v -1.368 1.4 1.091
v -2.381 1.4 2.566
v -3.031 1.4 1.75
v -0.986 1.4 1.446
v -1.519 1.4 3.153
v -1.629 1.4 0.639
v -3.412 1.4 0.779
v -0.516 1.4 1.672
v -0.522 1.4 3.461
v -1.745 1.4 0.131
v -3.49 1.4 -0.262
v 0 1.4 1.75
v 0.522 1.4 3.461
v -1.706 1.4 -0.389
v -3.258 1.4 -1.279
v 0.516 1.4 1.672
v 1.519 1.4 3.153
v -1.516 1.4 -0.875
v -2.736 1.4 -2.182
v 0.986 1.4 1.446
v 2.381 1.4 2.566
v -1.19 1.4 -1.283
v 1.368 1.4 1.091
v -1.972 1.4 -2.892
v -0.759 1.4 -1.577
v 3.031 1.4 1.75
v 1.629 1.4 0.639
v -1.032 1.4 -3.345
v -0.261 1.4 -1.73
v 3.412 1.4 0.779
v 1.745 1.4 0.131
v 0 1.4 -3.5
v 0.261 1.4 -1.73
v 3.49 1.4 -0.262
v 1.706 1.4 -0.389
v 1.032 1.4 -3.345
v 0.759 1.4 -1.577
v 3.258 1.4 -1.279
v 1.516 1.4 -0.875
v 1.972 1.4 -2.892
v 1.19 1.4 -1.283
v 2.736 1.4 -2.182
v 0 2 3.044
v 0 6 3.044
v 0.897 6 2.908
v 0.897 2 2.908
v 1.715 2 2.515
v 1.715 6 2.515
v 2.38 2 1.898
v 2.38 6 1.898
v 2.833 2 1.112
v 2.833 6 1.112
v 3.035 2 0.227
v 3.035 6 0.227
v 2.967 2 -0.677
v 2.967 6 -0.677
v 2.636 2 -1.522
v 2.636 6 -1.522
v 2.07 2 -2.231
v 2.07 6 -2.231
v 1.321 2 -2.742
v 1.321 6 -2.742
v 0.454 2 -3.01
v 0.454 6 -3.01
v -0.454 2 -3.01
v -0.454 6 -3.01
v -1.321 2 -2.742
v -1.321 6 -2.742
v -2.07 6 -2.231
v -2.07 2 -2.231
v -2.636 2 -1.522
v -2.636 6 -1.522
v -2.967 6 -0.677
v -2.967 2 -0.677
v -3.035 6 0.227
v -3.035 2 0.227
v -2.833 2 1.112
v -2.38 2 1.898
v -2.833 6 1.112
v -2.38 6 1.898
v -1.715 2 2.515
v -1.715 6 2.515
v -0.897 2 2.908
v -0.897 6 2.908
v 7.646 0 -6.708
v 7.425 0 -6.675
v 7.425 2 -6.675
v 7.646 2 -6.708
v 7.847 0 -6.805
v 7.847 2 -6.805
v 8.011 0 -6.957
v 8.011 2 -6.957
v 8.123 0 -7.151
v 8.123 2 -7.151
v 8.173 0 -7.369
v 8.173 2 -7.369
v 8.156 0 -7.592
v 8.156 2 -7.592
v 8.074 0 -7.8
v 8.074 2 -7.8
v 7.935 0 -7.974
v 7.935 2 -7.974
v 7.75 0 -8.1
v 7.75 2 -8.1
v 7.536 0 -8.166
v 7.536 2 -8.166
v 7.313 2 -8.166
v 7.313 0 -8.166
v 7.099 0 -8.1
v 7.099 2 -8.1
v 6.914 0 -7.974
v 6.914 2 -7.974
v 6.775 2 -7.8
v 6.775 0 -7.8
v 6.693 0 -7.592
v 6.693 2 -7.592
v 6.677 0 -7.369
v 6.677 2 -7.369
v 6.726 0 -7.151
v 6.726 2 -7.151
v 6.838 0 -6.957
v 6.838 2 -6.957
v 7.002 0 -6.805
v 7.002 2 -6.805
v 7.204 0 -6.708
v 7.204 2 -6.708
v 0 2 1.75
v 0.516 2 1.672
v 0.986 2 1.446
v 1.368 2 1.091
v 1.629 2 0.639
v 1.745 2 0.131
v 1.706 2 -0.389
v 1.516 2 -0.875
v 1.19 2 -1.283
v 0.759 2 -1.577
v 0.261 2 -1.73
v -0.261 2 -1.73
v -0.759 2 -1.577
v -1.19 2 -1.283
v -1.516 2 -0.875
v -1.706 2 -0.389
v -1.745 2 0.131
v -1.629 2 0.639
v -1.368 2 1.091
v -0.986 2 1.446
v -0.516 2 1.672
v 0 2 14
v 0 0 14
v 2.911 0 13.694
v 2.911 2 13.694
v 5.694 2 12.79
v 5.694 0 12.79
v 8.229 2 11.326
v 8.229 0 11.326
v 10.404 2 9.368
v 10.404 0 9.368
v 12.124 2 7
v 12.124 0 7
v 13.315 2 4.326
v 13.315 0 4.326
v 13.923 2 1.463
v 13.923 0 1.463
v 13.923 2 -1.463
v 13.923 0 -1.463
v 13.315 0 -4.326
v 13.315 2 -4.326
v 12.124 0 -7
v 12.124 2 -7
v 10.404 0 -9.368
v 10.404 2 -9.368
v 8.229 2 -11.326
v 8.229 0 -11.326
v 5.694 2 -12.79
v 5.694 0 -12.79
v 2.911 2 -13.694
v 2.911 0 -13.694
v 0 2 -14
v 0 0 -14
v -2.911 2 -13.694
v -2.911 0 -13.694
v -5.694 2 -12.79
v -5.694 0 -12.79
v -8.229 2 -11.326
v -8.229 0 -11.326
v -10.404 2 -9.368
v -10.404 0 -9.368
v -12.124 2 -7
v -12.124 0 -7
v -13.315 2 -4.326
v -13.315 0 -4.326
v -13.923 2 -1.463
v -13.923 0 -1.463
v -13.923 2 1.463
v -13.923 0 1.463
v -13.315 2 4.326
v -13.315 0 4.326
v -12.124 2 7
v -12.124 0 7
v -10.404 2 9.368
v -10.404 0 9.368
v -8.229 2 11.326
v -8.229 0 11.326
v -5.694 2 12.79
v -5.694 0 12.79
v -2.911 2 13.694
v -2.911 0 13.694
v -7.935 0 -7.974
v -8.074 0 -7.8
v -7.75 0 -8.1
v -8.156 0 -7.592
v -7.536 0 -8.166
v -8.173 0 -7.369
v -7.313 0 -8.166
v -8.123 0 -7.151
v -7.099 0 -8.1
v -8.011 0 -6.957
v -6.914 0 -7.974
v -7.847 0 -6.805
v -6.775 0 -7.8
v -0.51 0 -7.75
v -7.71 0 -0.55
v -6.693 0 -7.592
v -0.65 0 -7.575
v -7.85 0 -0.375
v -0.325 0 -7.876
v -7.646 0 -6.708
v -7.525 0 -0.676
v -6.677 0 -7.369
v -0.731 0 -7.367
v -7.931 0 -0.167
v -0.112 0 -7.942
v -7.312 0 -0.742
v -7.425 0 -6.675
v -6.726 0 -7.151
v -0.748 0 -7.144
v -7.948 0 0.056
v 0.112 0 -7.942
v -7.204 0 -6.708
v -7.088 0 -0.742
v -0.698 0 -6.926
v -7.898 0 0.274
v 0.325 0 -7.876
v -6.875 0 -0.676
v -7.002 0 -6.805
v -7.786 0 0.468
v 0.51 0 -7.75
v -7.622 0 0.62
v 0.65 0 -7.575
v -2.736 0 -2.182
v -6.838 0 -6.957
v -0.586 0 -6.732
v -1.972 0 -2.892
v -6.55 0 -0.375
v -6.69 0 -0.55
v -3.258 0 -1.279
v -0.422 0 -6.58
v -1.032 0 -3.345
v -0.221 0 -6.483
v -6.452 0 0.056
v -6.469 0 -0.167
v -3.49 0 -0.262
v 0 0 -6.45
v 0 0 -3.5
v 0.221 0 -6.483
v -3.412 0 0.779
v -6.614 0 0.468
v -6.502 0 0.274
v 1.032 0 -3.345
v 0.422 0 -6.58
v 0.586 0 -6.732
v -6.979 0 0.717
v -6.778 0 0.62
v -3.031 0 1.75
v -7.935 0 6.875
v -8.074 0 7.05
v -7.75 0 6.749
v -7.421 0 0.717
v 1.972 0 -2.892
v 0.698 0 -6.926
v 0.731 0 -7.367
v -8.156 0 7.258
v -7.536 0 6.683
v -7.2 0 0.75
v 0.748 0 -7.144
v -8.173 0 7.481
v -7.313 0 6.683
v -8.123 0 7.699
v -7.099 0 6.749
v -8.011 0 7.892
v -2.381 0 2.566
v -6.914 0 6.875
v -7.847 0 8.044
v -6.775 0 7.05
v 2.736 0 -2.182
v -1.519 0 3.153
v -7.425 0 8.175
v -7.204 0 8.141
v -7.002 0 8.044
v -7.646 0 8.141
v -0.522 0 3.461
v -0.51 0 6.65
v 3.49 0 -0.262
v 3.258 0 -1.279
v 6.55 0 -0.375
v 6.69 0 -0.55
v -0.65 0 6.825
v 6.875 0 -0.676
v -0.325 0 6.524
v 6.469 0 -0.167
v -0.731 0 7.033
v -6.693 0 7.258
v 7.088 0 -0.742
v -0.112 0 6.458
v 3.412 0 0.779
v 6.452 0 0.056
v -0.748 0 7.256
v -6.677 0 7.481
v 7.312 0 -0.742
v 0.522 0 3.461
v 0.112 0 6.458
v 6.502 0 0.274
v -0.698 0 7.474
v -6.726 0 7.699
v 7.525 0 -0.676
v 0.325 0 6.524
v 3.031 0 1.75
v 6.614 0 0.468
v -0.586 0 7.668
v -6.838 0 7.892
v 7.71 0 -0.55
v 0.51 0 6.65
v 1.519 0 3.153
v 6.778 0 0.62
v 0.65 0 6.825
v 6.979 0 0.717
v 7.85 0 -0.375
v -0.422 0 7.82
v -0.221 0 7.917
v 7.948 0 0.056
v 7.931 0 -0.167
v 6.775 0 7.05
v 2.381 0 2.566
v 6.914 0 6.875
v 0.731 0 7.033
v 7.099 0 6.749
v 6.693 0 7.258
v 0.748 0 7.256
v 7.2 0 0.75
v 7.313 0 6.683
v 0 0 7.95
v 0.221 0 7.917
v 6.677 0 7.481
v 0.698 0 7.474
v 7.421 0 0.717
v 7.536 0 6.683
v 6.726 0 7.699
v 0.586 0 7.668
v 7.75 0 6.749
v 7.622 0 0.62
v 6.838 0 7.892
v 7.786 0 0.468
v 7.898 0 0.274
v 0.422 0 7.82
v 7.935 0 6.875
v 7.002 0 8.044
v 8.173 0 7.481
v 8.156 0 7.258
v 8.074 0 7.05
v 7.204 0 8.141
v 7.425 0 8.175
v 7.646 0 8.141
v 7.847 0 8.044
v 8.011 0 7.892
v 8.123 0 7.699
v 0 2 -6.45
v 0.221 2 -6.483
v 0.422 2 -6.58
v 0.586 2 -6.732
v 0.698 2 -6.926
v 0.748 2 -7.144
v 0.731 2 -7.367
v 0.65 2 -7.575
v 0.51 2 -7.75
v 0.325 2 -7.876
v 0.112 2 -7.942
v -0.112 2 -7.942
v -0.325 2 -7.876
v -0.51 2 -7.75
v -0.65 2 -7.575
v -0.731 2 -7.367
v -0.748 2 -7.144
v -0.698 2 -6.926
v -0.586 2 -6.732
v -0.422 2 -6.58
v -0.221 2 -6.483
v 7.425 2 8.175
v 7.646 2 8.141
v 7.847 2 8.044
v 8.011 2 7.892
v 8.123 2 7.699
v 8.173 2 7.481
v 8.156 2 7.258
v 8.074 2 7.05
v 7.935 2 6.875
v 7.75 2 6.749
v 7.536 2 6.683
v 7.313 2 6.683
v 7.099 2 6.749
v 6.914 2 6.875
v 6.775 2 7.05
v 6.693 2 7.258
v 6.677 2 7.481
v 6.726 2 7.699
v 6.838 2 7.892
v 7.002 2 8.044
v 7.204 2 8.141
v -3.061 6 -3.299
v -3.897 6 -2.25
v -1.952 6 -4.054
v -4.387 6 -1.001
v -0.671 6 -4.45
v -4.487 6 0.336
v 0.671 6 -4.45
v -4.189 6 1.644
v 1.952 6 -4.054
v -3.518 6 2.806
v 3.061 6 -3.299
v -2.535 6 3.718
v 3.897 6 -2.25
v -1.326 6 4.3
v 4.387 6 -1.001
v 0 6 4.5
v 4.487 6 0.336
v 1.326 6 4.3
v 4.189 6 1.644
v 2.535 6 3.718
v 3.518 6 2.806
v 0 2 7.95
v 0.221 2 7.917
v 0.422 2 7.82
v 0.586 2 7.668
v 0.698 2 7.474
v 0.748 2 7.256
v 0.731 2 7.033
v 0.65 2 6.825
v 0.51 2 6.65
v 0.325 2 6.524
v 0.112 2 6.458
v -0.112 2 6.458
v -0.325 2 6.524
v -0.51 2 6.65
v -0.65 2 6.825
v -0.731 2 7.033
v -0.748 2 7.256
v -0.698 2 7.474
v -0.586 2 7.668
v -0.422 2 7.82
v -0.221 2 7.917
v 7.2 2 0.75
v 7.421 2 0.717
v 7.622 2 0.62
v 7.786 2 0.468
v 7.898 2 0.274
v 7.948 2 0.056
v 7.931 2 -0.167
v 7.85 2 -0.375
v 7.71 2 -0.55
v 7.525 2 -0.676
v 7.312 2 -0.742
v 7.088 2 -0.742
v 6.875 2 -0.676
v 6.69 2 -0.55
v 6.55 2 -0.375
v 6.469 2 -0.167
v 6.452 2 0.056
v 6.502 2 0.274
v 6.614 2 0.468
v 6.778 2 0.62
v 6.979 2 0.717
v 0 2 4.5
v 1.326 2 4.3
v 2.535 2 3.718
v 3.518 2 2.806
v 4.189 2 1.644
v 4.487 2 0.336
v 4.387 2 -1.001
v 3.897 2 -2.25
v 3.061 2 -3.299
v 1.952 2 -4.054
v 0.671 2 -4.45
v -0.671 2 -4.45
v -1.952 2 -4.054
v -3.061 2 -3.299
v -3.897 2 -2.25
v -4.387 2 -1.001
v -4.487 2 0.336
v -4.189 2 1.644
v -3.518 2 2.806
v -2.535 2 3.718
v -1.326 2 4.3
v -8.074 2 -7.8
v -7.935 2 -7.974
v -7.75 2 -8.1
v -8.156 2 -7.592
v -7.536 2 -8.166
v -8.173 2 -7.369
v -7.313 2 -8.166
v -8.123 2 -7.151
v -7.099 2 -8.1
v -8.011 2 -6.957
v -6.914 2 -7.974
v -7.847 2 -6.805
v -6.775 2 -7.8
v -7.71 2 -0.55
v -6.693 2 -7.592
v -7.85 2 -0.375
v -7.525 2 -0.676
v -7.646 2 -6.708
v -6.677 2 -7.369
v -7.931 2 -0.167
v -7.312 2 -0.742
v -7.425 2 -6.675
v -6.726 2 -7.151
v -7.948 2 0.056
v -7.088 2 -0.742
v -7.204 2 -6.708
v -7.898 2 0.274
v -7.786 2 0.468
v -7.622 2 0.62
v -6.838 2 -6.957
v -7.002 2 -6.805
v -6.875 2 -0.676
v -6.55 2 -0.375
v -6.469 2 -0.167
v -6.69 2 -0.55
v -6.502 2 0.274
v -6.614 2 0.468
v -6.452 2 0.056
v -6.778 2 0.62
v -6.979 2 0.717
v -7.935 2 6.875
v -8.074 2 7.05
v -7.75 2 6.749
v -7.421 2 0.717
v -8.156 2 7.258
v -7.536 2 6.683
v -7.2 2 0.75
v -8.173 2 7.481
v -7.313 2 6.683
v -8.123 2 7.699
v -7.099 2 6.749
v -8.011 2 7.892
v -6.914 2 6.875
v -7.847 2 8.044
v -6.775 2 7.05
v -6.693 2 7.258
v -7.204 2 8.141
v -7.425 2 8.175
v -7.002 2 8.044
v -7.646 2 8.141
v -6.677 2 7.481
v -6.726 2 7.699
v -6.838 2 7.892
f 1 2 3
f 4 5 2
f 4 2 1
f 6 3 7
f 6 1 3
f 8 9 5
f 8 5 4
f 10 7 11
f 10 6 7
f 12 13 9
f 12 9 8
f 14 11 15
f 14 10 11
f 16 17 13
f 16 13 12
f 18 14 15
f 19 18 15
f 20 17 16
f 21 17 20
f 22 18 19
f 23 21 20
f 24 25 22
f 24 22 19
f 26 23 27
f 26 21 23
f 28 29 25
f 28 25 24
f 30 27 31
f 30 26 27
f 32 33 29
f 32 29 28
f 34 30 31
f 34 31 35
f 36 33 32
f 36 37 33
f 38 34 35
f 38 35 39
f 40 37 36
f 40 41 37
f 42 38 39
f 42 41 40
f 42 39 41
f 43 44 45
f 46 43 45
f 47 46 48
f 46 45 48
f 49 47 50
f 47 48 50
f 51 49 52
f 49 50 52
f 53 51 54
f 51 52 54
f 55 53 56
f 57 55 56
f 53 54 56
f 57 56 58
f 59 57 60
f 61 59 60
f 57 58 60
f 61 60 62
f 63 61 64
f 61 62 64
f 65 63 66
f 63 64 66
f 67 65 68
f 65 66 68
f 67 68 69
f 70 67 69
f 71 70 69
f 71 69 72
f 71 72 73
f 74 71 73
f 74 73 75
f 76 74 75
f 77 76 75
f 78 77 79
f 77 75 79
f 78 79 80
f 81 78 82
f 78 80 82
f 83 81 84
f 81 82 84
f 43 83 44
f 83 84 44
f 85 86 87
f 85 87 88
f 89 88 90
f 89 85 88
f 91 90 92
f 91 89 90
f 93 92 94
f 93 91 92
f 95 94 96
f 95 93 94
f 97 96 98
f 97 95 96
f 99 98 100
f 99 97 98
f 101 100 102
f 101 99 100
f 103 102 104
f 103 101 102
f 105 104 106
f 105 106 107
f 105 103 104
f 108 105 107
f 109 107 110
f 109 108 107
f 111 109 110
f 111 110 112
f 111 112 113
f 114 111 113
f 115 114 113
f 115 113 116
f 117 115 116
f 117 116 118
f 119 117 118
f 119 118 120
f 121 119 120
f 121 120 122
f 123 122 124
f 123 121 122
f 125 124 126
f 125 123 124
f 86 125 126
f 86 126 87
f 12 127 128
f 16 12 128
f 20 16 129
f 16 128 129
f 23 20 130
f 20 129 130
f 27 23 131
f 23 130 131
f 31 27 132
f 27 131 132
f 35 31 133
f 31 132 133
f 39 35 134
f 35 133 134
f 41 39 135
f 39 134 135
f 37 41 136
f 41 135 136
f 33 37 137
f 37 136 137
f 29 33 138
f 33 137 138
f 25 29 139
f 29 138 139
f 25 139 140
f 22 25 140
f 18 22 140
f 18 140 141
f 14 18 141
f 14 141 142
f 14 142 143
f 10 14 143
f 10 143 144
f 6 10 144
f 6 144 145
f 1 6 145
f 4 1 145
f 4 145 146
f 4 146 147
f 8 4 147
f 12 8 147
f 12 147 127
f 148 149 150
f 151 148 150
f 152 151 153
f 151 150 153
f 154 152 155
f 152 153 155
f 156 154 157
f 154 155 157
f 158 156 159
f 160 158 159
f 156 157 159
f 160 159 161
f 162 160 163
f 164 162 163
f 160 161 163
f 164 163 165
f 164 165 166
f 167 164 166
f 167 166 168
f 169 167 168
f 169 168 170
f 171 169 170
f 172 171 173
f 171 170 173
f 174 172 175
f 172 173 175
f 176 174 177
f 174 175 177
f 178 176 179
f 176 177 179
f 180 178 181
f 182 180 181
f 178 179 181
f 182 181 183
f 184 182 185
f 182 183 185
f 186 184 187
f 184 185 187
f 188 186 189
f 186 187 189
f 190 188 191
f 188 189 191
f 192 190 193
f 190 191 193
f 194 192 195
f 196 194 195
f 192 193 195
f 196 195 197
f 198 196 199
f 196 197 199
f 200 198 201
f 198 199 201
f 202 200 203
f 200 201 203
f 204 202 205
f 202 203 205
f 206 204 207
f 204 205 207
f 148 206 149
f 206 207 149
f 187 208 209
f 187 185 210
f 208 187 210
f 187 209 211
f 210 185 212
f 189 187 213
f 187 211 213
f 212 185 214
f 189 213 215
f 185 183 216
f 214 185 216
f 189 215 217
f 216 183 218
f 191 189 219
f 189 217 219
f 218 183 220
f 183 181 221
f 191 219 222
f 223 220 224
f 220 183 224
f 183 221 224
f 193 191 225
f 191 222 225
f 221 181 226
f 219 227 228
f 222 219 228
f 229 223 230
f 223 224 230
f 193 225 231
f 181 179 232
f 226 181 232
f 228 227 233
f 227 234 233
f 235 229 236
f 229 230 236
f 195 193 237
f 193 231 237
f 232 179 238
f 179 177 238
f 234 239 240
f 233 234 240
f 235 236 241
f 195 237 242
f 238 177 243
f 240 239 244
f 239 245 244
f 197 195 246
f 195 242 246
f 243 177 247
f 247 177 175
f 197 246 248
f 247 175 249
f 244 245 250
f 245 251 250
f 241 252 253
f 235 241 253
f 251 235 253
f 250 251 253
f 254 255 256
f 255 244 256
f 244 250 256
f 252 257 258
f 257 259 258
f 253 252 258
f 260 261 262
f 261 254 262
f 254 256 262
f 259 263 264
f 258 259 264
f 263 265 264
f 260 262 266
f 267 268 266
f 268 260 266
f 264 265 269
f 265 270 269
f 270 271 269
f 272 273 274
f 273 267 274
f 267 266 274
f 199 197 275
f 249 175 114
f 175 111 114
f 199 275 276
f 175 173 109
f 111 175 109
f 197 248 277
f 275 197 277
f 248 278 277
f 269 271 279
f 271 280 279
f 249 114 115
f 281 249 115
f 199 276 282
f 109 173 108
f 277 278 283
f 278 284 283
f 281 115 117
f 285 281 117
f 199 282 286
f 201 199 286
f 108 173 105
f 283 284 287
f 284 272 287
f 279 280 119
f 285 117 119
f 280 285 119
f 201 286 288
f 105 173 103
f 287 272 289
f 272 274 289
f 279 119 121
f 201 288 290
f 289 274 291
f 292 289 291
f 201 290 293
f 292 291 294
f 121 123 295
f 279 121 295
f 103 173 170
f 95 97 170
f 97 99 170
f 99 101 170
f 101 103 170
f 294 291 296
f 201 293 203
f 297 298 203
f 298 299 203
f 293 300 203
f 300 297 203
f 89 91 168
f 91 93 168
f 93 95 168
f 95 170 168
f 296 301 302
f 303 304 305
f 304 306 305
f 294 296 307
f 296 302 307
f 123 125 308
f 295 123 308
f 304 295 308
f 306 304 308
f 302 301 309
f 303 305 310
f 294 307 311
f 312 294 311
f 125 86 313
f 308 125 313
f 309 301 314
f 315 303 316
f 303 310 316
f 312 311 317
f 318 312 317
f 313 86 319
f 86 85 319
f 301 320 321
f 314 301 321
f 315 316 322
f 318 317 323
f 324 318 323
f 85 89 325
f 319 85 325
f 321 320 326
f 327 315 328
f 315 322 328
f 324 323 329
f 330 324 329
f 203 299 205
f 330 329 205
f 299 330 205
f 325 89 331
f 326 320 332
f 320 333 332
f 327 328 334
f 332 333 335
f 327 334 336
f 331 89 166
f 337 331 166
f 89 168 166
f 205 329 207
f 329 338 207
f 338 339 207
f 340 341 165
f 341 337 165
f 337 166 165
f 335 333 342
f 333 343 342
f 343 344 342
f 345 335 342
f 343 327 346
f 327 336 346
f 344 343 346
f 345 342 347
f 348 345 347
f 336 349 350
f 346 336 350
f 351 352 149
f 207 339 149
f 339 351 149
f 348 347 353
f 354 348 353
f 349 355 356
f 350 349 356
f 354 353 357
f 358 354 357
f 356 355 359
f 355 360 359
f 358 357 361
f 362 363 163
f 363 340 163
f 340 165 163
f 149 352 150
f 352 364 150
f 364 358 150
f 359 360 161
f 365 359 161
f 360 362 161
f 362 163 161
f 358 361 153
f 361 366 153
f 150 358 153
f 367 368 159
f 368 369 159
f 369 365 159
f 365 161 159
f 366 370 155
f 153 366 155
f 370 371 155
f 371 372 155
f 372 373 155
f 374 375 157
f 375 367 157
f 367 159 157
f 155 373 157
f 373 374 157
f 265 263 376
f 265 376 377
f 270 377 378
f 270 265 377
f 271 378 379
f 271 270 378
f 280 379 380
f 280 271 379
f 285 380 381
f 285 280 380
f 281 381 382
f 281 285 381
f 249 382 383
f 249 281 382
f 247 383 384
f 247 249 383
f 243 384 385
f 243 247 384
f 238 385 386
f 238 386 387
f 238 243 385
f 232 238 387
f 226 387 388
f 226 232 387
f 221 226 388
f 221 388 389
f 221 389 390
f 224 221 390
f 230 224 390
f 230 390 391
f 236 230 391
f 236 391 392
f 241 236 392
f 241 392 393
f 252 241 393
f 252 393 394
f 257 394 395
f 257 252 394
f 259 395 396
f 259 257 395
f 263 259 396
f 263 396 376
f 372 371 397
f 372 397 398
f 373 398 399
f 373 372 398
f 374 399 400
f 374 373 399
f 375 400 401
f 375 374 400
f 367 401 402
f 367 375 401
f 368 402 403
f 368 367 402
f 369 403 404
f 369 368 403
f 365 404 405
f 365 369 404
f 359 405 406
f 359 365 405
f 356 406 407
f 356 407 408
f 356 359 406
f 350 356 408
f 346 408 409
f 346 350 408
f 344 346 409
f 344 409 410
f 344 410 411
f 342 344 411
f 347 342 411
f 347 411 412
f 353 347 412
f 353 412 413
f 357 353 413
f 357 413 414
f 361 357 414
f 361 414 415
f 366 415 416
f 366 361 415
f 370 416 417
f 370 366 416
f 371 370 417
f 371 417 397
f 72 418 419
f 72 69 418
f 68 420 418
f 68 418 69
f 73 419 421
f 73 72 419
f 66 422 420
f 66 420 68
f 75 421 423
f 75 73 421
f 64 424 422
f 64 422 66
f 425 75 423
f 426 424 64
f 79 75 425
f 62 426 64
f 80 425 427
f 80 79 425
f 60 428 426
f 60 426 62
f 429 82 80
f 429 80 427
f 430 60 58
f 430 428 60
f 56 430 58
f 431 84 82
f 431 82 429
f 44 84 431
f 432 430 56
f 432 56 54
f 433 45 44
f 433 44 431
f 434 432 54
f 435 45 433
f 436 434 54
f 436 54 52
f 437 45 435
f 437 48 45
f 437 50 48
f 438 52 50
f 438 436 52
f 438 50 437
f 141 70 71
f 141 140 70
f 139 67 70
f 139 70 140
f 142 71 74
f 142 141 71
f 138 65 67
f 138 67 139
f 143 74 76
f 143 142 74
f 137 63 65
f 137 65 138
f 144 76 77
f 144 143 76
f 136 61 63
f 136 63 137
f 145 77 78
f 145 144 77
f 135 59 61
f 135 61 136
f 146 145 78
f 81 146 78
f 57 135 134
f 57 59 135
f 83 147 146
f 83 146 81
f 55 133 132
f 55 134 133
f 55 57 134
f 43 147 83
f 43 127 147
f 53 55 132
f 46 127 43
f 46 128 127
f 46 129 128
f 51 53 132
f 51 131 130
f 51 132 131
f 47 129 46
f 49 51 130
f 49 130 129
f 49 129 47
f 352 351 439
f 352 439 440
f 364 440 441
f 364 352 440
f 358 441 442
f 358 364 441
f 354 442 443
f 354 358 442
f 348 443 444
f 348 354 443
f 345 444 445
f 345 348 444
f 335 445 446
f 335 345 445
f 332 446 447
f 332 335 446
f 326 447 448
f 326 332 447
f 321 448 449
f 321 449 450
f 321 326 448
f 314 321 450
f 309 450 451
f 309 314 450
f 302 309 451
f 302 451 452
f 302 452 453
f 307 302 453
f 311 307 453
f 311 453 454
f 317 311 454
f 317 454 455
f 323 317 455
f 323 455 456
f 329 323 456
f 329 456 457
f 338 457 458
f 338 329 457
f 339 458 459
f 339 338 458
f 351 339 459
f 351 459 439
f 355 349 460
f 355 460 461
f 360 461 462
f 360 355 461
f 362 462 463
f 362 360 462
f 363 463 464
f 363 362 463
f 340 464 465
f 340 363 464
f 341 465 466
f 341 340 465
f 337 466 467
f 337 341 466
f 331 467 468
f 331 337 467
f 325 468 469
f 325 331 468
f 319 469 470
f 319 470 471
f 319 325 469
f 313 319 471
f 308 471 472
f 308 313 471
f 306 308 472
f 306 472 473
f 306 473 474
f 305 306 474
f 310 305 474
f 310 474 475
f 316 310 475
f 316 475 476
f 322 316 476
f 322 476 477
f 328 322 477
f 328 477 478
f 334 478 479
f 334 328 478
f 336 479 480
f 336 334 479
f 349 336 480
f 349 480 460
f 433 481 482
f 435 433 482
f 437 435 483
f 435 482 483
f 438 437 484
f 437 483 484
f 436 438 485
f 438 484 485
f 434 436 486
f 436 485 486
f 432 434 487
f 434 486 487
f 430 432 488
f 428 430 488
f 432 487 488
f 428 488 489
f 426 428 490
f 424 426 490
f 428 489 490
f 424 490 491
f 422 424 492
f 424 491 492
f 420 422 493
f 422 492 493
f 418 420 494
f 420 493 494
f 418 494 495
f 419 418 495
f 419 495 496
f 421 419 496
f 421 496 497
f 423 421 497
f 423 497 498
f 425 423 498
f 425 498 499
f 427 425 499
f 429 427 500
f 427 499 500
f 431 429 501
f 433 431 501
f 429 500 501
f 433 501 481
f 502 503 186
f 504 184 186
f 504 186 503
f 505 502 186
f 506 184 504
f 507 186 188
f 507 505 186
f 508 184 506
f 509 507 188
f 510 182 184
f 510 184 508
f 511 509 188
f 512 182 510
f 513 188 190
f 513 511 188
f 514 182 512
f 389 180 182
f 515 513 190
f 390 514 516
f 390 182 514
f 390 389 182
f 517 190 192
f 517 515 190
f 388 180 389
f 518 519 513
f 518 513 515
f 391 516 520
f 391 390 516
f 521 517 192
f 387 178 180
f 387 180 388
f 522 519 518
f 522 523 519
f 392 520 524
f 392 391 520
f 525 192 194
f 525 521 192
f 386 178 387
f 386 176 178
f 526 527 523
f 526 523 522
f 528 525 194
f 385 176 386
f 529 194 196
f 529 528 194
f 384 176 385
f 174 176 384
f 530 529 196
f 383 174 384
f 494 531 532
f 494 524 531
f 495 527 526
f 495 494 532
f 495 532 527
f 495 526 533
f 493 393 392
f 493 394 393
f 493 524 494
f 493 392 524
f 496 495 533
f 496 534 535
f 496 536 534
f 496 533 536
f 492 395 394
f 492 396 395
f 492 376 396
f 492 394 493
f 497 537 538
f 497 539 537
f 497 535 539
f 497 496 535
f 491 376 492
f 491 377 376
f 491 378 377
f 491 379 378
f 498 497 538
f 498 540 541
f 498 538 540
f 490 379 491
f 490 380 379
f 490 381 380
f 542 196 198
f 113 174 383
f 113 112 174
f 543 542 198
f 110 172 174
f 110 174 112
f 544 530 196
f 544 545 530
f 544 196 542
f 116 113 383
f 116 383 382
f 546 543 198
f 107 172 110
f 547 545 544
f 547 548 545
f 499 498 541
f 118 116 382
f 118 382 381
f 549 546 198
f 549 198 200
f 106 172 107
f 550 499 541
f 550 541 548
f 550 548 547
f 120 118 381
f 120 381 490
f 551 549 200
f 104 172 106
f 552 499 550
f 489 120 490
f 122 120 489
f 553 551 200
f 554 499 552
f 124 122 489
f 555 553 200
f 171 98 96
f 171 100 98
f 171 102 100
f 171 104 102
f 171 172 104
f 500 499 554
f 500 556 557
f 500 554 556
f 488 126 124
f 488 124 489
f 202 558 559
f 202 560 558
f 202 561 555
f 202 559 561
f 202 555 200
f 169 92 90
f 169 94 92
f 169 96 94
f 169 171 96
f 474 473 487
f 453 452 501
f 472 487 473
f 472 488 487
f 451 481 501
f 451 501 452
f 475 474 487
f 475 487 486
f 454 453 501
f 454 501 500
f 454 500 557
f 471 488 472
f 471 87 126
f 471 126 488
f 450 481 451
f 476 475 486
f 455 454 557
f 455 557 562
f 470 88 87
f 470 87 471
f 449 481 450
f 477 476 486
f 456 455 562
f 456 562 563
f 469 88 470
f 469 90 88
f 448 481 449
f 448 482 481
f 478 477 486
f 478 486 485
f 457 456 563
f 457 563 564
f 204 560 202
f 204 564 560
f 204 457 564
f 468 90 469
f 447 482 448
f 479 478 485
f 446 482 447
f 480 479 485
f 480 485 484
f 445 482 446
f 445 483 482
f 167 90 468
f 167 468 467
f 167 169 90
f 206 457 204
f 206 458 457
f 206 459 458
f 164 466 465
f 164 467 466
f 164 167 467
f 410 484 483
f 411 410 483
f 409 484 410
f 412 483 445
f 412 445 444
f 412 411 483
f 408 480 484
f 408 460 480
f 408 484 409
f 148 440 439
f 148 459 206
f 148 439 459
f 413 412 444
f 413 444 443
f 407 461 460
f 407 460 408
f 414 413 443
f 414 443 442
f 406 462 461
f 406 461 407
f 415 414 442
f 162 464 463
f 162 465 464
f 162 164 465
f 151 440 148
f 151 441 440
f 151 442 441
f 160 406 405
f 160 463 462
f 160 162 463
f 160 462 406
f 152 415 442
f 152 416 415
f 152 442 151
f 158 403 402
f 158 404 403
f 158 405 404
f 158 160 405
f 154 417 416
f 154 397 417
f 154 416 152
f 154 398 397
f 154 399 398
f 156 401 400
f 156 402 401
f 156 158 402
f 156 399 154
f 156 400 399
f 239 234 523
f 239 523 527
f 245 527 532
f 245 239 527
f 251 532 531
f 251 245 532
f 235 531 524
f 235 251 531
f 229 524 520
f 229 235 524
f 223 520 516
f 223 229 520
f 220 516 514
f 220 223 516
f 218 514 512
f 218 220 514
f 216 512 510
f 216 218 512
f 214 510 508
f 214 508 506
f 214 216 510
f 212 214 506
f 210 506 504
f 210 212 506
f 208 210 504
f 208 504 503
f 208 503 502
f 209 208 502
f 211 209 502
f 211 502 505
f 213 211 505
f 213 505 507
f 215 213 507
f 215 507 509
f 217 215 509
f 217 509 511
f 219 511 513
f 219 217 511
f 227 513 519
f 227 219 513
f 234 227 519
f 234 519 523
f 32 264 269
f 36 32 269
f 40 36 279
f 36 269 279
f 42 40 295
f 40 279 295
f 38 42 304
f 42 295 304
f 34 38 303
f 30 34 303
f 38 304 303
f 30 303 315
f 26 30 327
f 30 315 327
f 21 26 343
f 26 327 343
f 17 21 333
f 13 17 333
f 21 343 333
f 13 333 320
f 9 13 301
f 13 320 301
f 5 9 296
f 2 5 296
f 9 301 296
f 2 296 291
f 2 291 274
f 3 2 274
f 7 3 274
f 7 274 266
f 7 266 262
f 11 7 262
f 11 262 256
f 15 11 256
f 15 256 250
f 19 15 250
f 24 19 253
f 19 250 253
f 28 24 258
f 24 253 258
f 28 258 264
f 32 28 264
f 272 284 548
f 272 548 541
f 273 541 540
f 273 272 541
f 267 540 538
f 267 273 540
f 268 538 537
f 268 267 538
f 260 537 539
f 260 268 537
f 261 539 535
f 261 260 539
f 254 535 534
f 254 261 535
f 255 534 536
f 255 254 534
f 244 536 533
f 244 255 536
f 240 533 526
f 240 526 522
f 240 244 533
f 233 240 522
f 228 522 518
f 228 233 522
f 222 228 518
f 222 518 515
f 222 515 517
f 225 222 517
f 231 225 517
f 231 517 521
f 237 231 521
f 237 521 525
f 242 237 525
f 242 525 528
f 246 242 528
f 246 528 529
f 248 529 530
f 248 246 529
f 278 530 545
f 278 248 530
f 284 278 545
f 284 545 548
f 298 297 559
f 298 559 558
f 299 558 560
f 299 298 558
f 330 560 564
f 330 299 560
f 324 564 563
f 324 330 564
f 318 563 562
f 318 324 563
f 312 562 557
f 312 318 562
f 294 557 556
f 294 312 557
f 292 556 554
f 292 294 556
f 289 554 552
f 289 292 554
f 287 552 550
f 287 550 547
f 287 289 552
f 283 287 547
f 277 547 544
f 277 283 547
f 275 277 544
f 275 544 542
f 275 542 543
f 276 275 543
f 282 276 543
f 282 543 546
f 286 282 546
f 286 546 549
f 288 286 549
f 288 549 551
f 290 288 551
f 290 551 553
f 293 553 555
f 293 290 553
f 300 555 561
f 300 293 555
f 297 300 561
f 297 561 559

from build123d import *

# Parameters (mm, degrees)
ESQUISSE1_R             = 14
ESQUISSE1_R_2           = 0.75
BOSS_EXTRU_1_DEPTH      = 2
ESQUISSE2_R             = 4.5
BOSS_EXTRU_2_DEPTH      = 4
ESQUISSE3_R             = 3.043591675
ENL_V_MAT_EXTRU_1_DEPTH = 4
ESQUISSE4_R             = 1.75
ENL_V_MAT_EXTRU_2_DEPTH = 4
ESQUISSE5_R             = 3.5
ENL_V_MAT_EXTRU_3_DEPTH = 1.4


with BuildPart() as part:
    # Esquisse1 → Boss.-Extru.1 (new body)
    with BuildSketch(Plane(origin=(0, 0, 0), x_dir=(1, 0, 0), z_dir=(0, 1, 0))):
        with Locations(Location((0, 0, 0), (0, 0, 270))):
            Circle(ESQUISSE1_R)
        with Locations(Location((0, 7.2, 0), (0, 0, 270))):
            Circle(ESQUISSE1_R_2, mode=Mode.SUBTRACT)
        with Locations(Location((7.424621202, 7.424621202, 0), (0, 0, 270))):
            Circle(ESQUISSE1_R_2, mode=Mode.SUBTRACT)
        with Locations(Location((7.424621202, -7.424621202, 0), (0, 0, 270))):
            Circle(ESQUISSE1_R_2, mode=Mode.SUBTRACT)
        with Locations(Location((7.2, 0, 0), (0, 0, 270))):
            Circle(ESQUISSE1_R_2, mode=Mode.SUBTRACT)
        with Locations(Location((-7.424621202, -7.424621202, 0), (0, 0, 270))):
            Circle(ESQUISSE1_R_2, mode=Mode.SUBTRACT)
        with Locations(Location((0, -7.2, 0), (0, 0, 270))):
            Circle(ESQUISSE1_R_2, mode=Mode.SUBTRACT)
        with Locations(Location((-7.424621202, 7.424621202, 0), (0, 0, 270))):
            Circle(ESQUISSE1_R_2, mode=Mode.SUBTRACT)
        with Locations(Location((-7.2, 0, 0), (0, 0, 270))):
            Circle(ESQUISSE1_R_2, mode=Mode.SUBTRACT)
    extrude(amount=BOSS_EXTRU_1_DEPTH)

    # Esquisse2 → Boss.-Extru.2 (add)
    with BuildSketch(Plane(origin=(0, 2, 0), x_dir=(1, 0, 0), z_dir=(0, 1, 0))):
        with Locations(Location((0, 0, 0), (0, 0, 270))):
            Circle(ESQUISSE2_R)
    extrude(amount=BOSS_EXTRU_2_DEPTH)

    # Esquisse3 → Enlèv. mat.-Extru.1 (cut)
    with BuildSketch(Plane(origin=(0, 6, 0), x_dir=(1, 0, 0), z_dir=(0, 1, 0))):
        with Locations(Location((0, 0, 0), (0, 0, 270))):
            Circle(ESQUISSE3_R)
    extrude(amount=-ENL_V_MAT_EXTRU_1_DEPTH, mode=Mode.SUBTRACT)

    # Esquisse4 → Enlèv. mat.-Extru.2 (cut)
    with BuildSketch(Plane(origin=(0, 2, 0), x_dir=(1, 0, 0), z_dir=(0, 1, 0))):
        with Locations(Location((0, 0, 0), (0, 0, 270))):
            Circle(ESQUISSE4_R)
    extrude(amount=-ENL_V_MAT_EXTRU_2_DEPTH, mode=Mode.SUBTRACT)

    # Esquisse5 → Enlèv. mat.-Extru.3 (cut)
    with BuildSketch(Plane(origin=(0, 0, 0), x_dir=(-1, 0, 0), z_dir=(0, -1, 0))):
        with Locations(Location((0, 0, 0), (0, 0, 90))):
            Circle(ESQUISSE5_R)
    extrude(amount=-ENL_V_MAT_EXTRU_3_DEPTH, mode=Mode.SUBTRACT)


solid = part.part
